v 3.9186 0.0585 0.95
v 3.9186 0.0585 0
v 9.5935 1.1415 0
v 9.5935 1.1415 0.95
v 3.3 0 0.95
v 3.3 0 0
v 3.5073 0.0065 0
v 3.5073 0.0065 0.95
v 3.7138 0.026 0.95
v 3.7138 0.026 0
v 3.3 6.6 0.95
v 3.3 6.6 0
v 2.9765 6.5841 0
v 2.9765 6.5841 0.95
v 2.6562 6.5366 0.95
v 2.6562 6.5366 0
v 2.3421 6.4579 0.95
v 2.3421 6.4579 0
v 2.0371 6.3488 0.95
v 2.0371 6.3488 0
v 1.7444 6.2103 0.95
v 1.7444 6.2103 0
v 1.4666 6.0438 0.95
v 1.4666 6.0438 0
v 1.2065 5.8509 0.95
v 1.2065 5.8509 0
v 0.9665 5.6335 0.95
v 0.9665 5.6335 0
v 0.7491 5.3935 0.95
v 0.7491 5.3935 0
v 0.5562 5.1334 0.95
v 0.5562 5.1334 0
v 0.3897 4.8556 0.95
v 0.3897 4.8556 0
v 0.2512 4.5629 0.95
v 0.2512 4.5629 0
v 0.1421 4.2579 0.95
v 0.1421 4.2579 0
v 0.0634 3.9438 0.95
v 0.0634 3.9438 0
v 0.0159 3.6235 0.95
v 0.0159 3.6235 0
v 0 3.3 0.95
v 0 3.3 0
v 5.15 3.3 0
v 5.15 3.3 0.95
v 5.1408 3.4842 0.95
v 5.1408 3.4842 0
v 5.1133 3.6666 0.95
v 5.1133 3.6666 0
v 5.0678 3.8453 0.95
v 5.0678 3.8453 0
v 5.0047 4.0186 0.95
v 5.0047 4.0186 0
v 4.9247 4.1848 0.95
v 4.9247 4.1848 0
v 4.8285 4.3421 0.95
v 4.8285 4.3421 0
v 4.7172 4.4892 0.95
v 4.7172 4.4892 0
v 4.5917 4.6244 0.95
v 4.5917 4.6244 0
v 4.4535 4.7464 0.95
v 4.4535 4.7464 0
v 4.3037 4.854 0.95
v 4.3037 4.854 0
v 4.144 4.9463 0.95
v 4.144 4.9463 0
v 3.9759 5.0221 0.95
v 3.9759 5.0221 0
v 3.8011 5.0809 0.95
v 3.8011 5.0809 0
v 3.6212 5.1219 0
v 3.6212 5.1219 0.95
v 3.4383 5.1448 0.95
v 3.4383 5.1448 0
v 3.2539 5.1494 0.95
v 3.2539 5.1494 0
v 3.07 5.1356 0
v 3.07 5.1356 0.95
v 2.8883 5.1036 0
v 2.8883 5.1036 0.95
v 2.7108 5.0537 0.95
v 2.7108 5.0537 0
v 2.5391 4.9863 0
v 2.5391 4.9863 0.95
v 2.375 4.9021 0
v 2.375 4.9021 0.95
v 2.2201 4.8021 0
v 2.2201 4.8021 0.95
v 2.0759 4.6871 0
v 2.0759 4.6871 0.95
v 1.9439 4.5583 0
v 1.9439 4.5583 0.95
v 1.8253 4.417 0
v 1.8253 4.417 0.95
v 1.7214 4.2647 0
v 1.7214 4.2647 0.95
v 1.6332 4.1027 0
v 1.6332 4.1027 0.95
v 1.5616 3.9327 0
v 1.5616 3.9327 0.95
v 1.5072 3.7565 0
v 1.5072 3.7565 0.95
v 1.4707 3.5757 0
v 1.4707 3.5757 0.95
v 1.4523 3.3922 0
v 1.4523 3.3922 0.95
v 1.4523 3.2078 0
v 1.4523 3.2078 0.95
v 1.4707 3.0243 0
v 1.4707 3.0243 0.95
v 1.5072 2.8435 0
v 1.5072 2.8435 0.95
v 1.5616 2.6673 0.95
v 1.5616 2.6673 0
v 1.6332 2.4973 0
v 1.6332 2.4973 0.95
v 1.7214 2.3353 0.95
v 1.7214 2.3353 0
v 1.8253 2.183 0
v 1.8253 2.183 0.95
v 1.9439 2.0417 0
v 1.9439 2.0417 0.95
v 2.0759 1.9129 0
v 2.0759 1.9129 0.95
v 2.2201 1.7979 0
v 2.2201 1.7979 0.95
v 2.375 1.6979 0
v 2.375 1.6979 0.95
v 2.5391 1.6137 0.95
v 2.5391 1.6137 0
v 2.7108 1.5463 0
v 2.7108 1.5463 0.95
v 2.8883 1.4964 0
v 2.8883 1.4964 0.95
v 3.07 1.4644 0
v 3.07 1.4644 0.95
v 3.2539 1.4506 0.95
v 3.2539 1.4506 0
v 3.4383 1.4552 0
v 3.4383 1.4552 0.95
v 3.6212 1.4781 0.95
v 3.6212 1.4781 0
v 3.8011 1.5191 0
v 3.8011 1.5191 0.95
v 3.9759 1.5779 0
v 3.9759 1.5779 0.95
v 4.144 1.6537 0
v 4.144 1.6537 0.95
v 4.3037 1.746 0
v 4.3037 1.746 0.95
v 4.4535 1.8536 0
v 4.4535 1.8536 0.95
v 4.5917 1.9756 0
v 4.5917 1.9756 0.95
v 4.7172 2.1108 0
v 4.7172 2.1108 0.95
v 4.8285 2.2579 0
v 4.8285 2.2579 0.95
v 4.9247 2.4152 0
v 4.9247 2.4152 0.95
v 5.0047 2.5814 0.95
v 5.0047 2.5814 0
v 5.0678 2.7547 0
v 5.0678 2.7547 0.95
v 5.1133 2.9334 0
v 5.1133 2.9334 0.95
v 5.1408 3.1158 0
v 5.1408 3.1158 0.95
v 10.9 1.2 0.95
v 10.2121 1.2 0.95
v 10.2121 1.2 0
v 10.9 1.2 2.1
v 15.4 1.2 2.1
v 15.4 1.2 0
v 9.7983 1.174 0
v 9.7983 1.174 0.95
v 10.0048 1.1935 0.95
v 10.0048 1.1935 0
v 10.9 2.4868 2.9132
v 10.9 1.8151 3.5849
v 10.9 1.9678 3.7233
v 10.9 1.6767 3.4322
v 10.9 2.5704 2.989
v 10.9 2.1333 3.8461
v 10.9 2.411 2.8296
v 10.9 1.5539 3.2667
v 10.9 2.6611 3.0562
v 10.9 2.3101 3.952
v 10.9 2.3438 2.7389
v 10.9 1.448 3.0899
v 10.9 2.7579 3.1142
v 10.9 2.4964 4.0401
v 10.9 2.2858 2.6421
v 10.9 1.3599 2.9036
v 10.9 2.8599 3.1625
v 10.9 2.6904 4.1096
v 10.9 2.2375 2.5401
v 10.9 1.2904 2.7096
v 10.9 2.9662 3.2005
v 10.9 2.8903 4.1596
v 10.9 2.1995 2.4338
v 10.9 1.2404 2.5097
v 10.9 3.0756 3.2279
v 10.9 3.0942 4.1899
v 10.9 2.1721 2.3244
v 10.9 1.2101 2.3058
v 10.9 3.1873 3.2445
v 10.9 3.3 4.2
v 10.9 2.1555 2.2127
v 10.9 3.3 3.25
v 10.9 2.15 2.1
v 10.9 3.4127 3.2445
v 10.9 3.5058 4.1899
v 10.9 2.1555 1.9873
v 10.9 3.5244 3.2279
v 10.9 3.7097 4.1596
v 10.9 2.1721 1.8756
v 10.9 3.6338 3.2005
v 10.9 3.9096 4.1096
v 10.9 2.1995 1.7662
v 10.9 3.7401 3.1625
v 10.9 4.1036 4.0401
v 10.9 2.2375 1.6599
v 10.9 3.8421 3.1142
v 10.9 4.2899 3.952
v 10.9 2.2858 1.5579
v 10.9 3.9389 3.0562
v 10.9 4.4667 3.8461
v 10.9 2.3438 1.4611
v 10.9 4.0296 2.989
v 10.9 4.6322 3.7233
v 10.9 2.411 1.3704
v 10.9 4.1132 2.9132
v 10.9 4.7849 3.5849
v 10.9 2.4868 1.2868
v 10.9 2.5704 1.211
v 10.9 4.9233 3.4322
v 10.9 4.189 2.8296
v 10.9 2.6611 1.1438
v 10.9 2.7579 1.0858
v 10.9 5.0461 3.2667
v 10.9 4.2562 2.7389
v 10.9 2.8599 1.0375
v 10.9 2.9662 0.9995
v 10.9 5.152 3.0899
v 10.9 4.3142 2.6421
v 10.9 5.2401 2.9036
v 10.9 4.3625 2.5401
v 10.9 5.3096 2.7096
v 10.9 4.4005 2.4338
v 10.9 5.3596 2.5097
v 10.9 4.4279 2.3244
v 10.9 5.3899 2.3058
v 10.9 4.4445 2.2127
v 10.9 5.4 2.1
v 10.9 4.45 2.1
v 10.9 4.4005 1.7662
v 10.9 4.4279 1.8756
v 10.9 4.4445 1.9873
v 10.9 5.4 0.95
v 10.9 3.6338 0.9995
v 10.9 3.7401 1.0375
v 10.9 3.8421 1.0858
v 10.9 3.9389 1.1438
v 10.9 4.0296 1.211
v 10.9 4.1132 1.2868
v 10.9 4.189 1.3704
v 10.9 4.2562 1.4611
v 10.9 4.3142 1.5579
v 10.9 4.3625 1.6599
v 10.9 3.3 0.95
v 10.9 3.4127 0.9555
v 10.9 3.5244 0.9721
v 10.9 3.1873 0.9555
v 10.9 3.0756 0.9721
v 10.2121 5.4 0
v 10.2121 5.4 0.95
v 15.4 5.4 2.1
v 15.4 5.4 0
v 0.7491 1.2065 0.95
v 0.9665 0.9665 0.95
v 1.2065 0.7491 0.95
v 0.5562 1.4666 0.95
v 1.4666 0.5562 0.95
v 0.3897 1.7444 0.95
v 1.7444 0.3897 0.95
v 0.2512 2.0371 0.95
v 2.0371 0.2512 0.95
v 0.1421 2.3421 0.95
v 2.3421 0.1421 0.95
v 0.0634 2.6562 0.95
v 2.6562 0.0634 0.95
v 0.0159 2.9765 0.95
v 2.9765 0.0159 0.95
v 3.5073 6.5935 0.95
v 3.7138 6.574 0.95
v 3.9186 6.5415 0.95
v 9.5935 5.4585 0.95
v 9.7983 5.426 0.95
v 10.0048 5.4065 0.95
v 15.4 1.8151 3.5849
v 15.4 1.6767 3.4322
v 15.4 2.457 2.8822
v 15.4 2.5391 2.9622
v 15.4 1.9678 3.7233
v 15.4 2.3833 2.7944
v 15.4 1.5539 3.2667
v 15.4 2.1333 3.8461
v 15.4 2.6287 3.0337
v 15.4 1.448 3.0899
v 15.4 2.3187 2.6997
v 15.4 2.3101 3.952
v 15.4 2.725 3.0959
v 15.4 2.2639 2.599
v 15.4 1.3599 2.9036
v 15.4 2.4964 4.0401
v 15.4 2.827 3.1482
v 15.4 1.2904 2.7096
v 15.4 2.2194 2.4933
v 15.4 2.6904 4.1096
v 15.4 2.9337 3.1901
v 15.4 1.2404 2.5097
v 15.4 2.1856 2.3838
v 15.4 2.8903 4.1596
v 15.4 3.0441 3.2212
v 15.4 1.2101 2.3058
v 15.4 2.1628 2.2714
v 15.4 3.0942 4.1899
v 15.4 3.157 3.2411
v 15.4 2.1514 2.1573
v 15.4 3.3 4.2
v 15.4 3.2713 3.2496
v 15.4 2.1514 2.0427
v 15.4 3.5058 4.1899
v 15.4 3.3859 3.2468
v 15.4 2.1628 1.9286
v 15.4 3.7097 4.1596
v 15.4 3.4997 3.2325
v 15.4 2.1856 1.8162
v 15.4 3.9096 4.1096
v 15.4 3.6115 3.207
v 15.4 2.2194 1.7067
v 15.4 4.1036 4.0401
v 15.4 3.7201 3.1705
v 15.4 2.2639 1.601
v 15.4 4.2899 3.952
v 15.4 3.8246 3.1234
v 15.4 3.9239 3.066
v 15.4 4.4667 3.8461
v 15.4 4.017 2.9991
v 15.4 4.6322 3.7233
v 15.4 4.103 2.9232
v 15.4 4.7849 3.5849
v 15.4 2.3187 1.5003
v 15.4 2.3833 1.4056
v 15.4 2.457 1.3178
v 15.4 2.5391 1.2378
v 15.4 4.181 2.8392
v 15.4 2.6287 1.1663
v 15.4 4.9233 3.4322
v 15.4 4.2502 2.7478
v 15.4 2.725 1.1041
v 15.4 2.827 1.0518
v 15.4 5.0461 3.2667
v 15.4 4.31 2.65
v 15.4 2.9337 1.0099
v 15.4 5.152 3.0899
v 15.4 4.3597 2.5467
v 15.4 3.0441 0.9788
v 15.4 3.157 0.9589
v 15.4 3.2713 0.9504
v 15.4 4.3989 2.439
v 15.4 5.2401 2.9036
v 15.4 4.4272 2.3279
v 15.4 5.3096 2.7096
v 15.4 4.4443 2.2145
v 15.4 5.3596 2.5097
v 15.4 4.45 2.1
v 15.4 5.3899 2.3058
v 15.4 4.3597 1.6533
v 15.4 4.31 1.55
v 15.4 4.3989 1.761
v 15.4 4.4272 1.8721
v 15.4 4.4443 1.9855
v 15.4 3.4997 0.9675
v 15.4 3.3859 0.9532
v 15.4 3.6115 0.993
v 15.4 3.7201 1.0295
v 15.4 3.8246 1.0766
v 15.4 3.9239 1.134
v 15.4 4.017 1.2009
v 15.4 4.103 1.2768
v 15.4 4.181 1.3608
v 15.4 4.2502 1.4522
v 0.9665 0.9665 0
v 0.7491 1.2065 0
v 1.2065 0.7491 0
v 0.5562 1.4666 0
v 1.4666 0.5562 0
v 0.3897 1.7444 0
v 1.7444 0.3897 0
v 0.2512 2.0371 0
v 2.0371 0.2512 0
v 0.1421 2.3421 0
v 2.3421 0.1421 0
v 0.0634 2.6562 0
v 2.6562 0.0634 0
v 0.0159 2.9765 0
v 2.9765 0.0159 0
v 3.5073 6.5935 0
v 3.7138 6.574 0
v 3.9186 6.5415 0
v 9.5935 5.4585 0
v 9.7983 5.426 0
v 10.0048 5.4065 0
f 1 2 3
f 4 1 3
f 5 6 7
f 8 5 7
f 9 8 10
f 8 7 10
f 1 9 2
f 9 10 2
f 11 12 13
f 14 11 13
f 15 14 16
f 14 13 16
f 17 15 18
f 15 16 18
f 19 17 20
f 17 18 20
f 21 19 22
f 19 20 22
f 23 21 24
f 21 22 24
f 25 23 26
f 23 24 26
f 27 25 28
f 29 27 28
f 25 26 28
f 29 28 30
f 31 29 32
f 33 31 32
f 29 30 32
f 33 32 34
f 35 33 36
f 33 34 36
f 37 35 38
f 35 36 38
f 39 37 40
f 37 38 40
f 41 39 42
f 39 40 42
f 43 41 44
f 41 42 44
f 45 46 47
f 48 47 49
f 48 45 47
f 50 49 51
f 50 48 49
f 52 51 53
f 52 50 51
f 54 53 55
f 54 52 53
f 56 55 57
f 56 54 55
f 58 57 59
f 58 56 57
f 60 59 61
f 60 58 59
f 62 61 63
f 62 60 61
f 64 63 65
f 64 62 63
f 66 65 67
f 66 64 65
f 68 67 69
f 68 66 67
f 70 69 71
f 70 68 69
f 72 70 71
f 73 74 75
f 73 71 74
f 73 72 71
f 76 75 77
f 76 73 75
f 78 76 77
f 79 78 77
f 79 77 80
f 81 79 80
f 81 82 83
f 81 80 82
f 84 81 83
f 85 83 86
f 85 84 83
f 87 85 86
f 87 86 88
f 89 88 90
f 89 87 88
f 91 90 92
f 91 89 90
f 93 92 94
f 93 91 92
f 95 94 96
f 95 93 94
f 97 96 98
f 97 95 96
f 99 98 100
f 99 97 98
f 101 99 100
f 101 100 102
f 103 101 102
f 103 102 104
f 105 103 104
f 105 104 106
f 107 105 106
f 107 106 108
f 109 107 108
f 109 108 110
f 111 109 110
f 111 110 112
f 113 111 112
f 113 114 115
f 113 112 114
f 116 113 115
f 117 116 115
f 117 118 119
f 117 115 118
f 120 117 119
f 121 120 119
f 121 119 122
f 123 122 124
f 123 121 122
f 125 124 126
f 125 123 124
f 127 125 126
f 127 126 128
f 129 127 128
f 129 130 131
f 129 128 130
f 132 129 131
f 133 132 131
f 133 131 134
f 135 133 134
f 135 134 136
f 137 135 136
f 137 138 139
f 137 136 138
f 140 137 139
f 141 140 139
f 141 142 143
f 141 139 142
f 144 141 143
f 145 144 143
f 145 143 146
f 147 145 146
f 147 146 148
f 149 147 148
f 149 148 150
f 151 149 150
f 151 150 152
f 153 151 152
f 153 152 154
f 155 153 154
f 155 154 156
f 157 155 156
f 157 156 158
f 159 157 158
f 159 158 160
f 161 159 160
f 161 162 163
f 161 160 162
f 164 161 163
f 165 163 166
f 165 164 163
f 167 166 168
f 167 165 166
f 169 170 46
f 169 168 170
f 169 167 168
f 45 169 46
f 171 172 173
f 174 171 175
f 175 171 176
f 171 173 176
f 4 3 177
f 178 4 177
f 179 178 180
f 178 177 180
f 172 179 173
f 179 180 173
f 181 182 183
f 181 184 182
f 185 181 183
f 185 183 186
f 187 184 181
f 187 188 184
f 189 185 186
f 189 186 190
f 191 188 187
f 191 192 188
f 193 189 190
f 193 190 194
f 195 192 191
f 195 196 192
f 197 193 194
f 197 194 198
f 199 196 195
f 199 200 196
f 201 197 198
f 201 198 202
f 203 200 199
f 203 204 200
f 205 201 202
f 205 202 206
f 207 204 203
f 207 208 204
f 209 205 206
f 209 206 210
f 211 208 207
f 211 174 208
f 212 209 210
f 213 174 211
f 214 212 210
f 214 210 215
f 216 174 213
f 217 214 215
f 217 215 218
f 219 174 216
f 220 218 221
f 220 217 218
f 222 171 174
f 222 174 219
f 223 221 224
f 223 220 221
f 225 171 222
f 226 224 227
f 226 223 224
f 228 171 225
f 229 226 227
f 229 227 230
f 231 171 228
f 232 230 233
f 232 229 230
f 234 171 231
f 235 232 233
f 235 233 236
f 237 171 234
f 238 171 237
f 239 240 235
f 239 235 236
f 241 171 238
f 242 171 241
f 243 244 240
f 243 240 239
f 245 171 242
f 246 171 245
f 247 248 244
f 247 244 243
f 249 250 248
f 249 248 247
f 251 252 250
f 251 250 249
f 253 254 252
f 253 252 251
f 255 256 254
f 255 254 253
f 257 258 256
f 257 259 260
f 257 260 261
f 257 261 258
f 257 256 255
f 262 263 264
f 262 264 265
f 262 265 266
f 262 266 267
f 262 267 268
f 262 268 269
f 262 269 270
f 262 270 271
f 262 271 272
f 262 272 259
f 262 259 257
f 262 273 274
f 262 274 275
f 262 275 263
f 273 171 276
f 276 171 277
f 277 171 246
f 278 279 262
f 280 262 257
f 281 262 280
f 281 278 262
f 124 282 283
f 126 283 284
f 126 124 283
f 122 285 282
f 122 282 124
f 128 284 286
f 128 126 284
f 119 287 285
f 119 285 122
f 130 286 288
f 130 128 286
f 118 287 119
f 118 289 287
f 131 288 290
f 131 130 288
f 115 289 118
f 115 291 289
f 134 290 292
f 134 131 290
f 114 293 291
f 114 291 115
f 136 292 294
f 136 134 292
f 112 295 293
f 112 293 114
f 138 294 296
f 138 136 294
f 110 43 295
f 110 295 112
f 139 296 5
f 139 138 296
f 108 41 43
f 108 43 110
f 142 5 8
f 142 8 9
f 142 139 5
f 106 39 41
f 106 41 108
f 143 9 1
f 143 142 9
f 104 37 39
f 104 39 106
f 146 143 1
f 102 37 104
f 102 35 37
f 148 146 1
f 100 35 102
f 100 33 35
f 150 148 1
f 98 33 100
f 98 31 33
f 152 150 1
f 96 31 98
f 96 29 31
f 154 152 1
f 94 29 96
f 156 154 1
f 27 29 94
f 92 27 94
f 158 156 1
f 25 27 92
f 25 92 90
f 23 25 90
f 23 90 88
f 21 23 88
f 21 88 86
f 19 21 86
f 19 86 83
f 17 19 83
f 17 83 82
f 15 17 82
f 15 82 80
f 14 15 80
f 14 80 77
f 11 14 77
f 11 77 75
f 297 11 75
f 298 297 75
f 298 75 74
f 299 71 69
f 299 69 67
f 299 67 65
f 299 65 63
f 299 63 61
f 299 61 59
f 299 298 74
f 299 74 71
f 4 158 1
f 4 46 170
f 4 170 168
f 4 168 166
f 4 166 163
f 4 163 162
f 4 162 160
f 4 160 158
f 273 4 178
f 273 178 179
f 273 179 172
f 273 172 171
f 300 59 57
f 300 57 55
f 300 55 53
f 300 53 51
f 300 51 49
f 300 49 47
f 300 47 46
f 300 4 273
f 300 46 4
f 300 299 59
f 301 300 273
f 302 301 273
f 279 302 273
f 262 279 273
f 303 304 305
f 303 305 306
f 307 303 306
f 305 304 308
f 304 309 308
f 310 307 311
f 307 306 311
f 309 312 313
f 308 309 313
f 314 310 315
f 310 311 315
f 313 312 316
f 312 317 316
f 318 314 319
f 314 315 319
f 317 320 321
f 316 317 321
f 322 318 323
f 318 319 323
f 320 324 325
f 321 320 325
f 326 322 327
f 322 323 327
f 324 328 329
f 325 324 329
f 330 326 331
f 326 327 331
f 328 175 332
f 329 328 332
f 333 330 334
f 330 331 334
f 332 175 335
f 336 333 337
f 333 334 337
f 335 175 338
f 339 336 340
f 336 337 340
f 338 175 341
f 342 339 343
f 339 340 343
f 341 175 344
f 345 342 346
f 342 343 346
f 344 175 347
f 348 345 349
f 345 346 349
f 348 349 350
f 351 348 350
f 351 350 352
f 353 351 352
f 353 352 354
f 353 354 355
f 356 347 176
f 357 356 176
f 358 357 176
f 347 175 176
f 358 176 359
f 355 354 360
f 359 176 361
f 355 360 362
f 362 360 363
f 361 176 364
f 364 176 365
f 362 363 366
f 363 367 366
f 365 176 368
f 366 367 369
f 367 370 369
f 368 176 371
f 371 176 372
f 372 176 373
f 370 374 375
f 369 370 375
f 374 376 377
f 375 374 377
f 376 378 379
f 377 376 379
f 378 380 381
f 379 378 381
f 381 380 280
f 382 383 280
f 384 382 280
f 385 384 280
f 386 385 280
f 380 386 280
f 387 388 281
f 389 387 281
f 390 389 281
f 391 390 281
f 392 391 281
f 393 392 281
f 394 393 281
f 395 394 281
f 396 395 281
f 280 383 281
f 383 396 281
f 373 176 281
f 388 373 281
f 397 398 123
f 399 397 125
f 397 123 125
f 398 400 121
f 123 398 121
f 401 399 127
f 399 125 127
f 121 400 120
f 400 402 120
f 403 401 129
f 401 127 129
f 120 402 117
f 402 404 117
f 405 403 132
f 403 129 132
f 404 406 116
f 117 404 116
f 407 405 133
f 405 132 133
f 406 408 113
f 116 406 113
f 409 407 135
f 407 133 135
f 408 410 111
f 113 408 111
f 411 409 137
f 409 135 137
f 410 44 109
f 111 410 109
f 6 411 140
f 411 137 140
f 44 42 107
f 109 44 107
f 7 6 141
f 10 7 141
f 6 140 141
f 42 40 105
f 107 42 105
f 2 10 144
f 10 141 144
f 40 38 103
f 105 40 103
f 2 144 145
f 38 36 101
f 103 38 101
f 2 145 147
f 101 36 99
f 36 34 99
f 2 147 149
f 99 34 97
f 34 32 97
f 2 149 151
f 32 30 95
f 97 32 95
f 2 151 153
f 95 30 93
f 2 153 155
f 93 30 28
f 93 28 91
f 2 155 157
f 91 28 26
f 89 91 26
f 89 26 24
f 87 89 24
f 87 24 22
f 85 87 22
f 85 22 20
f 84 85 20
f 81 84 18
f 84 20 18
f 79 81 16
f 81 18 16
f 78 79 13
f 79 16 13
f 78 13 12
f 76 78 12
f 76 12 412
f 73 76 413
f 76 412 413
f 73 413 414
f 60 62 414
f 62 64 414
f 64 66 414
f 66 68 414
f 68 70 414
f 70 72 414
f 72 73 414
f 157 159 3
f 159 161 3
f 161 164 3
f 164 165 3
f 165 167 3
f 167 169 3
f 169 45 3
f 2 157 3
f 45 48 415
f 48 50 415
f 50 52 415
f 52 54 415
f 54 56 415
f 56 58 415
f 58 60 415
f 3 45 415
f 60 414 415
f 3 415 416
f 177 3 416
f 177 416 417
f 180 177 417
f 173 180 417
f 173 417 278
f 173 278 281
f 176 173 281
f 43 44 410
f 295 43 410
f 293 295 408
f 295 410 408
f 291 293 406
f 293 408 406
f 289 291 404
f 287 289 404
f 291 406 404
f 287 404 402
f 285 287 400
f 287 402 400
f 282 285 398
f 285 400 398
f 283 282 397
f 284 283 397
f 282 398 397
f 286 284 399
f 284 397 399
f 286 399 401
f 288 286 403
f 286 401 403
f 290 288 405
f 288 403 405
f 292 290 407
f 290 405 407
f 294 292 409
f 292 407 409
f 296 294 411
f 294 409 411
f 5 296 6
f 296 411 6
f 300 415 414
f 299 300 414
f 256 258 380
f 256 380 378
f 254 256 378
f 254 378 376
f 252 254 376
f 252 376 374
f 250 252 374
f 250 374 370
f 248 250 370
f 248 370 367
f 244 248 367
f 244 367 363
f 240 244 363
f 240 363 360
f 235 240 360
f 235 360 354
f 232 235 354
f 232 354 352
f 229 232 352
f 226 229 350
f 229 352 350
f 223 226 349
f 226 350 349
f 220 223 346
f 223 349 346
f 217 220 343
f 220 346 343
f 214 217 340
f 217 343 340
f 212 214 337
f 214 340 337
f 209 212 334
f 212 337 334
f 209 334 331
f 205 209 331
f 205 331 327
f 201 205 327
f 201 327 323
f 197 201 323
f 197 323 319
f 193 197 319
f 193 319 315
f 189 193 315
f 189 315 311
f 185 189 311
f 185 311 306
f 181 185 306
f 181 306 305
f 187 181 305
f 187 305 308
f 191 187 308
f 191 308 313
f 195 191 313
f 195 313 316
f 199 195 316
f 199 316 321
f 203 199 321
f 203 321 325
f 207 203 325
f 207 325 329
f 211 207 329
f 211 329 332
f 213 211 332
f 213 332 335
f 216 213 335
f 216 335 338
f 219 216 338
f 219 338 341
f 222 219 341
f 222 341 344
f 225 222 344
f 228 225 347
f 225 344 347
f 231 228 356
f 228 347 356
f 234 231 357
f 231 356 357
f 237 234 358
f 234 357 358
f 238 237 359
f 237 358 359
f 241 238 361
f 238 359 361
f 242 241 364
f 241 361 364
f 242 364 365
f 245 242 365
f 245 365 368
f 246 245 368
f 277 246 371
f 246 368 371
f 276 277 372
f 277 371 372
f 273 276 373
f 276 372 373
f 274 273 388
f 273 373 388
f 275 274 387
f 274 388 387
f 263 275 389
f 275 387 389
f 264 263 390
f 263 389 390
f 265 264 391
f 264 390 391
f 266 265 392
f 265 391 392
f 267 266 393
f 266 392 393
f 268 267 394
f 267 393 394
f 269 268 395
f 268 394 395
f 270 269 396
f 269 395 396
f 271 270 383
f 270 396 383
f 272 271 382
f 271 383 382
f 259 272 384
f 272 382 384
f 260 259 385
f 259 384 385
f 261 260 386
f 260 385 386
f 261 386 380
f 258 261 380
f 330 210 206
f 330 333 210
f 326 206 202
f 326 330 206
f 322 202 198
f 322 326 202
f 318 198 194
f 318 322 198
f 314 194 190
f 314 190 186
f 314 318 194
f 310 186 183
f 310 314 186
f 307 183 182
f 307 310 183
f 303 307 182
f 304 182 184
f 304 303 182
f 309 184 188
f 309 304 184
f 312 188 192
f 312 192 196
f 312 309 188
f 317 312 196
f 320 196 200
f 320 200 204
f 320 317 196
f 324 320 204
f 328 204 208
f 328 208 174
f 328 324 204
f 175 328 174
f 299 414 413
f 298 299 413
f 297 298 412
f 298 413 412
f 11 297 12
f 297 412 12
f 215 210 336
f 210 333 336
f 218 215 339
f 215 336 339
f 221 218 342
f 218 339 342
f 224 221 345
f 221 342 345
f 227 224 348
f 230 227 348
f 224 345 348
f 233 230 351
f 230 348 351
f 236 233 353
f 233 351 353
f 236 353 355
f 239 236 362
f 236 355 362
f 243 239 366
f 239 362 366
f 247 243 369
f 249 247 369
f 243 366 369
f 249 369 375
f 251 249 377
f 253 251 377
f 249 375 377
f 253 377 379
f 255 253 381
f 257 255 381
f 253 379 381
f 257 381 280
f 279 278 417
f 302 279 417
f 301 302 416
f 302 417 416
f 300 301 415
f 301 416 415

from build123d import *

# Parameters (mm, degrees)
F0_R     = 1.85
F1_DEPTH = 0.95
F2_W     = 4.5
F2_H     = 4.2
F3_DEPTH = 3.25
F4_R     = 2.09999
F5_R     = 1.15
F6_DEPTH = 25


# Not quite as in the source:
# - a fillet or chamfer is up to 0.001 mm smaller than in the source, because OpenCascade refuses the exact size


with BuildPart() as f1:
    # F0 (on Top) → F1 (new body)
    with BuildSketch(Plane.XY):
        with BuildLine():
            Line((10.9, 1.2), (15.4, 1.2))
            Line((15.4, 1.2), (15.4, 5.4))
            Line((15.4, 5.4), (10.9, 5.4))
            Line((10.9, 5.4), (10.2120730928, 5.4))
            ThreePointArc((10.2120730928, 5.4), (9.9013861494, 5.4146577616), (9.5934591909, 5.4585008344))
            Line((9.5934591909, 5.4585008344), (3.9186139019, 6.5414991656))
            ThreePointArc((3.9186139019, 6.5414991656), (3.6106869434, 6.5853422384), (3.3, 6.6))
            ThreePointArc((3.3, 6.6), (0.9665476221, 5.6334523779), (0, 3.3))
            ThreePointArc((0, 3.3), (0.9665476221, 0.9665476221), (3.3, 0))
            ThreePointArc((3.3, 0), (3.6106869434, 0.0146577616), (3.9186139019, 0.0585008344))
            Line((3.9186139019, 0.0585008344), (9.5934591909, 1.1414991656))
            ThreePointArc((9.5934591909, 1.1414991656), (9.9013861494, 1.1853422384), (10.2120730928, 1.2))
            Line((10.2120730928, 1.2), (10.9, 1.2))
        make_face()
        with Locations((3.3, 3.3)):
            Circle(F0_R, mode=Mode.SUBTRACT)
    extrude(amount=F1_DEPTH)

    # F2 (on face) → F3 (join)
    with BuildSketch(Plane.XY.offset(0.95)):
        with Locations((13.15, 3.3)):
            Rectangle(F2_W, F2_H)
    extrude(amount=F3_DEPTH)

    # F4 (radius 2.1 in the source; OpenCascade refuses exactly that, so slightly less here)
    f4_edges = [f1.edges().sort_by_distance(p)[0] for p in [
        (13.15, 5.4, 4.2),
        (13.15, 1.2, 4.2),
    ]]
    fillet(f4_edges, radius=F4_R)

    # F5 (on face) → F6 (cut)
    with BuildSketch(Plane.YZ.offset(15.4)):
        with Locations((3.3, 2.1)):
            Circle(F5_R)
    extrude(amount=-F6_DEPTH, mode=Mode.SUBTRACT)


solid = f1.part
